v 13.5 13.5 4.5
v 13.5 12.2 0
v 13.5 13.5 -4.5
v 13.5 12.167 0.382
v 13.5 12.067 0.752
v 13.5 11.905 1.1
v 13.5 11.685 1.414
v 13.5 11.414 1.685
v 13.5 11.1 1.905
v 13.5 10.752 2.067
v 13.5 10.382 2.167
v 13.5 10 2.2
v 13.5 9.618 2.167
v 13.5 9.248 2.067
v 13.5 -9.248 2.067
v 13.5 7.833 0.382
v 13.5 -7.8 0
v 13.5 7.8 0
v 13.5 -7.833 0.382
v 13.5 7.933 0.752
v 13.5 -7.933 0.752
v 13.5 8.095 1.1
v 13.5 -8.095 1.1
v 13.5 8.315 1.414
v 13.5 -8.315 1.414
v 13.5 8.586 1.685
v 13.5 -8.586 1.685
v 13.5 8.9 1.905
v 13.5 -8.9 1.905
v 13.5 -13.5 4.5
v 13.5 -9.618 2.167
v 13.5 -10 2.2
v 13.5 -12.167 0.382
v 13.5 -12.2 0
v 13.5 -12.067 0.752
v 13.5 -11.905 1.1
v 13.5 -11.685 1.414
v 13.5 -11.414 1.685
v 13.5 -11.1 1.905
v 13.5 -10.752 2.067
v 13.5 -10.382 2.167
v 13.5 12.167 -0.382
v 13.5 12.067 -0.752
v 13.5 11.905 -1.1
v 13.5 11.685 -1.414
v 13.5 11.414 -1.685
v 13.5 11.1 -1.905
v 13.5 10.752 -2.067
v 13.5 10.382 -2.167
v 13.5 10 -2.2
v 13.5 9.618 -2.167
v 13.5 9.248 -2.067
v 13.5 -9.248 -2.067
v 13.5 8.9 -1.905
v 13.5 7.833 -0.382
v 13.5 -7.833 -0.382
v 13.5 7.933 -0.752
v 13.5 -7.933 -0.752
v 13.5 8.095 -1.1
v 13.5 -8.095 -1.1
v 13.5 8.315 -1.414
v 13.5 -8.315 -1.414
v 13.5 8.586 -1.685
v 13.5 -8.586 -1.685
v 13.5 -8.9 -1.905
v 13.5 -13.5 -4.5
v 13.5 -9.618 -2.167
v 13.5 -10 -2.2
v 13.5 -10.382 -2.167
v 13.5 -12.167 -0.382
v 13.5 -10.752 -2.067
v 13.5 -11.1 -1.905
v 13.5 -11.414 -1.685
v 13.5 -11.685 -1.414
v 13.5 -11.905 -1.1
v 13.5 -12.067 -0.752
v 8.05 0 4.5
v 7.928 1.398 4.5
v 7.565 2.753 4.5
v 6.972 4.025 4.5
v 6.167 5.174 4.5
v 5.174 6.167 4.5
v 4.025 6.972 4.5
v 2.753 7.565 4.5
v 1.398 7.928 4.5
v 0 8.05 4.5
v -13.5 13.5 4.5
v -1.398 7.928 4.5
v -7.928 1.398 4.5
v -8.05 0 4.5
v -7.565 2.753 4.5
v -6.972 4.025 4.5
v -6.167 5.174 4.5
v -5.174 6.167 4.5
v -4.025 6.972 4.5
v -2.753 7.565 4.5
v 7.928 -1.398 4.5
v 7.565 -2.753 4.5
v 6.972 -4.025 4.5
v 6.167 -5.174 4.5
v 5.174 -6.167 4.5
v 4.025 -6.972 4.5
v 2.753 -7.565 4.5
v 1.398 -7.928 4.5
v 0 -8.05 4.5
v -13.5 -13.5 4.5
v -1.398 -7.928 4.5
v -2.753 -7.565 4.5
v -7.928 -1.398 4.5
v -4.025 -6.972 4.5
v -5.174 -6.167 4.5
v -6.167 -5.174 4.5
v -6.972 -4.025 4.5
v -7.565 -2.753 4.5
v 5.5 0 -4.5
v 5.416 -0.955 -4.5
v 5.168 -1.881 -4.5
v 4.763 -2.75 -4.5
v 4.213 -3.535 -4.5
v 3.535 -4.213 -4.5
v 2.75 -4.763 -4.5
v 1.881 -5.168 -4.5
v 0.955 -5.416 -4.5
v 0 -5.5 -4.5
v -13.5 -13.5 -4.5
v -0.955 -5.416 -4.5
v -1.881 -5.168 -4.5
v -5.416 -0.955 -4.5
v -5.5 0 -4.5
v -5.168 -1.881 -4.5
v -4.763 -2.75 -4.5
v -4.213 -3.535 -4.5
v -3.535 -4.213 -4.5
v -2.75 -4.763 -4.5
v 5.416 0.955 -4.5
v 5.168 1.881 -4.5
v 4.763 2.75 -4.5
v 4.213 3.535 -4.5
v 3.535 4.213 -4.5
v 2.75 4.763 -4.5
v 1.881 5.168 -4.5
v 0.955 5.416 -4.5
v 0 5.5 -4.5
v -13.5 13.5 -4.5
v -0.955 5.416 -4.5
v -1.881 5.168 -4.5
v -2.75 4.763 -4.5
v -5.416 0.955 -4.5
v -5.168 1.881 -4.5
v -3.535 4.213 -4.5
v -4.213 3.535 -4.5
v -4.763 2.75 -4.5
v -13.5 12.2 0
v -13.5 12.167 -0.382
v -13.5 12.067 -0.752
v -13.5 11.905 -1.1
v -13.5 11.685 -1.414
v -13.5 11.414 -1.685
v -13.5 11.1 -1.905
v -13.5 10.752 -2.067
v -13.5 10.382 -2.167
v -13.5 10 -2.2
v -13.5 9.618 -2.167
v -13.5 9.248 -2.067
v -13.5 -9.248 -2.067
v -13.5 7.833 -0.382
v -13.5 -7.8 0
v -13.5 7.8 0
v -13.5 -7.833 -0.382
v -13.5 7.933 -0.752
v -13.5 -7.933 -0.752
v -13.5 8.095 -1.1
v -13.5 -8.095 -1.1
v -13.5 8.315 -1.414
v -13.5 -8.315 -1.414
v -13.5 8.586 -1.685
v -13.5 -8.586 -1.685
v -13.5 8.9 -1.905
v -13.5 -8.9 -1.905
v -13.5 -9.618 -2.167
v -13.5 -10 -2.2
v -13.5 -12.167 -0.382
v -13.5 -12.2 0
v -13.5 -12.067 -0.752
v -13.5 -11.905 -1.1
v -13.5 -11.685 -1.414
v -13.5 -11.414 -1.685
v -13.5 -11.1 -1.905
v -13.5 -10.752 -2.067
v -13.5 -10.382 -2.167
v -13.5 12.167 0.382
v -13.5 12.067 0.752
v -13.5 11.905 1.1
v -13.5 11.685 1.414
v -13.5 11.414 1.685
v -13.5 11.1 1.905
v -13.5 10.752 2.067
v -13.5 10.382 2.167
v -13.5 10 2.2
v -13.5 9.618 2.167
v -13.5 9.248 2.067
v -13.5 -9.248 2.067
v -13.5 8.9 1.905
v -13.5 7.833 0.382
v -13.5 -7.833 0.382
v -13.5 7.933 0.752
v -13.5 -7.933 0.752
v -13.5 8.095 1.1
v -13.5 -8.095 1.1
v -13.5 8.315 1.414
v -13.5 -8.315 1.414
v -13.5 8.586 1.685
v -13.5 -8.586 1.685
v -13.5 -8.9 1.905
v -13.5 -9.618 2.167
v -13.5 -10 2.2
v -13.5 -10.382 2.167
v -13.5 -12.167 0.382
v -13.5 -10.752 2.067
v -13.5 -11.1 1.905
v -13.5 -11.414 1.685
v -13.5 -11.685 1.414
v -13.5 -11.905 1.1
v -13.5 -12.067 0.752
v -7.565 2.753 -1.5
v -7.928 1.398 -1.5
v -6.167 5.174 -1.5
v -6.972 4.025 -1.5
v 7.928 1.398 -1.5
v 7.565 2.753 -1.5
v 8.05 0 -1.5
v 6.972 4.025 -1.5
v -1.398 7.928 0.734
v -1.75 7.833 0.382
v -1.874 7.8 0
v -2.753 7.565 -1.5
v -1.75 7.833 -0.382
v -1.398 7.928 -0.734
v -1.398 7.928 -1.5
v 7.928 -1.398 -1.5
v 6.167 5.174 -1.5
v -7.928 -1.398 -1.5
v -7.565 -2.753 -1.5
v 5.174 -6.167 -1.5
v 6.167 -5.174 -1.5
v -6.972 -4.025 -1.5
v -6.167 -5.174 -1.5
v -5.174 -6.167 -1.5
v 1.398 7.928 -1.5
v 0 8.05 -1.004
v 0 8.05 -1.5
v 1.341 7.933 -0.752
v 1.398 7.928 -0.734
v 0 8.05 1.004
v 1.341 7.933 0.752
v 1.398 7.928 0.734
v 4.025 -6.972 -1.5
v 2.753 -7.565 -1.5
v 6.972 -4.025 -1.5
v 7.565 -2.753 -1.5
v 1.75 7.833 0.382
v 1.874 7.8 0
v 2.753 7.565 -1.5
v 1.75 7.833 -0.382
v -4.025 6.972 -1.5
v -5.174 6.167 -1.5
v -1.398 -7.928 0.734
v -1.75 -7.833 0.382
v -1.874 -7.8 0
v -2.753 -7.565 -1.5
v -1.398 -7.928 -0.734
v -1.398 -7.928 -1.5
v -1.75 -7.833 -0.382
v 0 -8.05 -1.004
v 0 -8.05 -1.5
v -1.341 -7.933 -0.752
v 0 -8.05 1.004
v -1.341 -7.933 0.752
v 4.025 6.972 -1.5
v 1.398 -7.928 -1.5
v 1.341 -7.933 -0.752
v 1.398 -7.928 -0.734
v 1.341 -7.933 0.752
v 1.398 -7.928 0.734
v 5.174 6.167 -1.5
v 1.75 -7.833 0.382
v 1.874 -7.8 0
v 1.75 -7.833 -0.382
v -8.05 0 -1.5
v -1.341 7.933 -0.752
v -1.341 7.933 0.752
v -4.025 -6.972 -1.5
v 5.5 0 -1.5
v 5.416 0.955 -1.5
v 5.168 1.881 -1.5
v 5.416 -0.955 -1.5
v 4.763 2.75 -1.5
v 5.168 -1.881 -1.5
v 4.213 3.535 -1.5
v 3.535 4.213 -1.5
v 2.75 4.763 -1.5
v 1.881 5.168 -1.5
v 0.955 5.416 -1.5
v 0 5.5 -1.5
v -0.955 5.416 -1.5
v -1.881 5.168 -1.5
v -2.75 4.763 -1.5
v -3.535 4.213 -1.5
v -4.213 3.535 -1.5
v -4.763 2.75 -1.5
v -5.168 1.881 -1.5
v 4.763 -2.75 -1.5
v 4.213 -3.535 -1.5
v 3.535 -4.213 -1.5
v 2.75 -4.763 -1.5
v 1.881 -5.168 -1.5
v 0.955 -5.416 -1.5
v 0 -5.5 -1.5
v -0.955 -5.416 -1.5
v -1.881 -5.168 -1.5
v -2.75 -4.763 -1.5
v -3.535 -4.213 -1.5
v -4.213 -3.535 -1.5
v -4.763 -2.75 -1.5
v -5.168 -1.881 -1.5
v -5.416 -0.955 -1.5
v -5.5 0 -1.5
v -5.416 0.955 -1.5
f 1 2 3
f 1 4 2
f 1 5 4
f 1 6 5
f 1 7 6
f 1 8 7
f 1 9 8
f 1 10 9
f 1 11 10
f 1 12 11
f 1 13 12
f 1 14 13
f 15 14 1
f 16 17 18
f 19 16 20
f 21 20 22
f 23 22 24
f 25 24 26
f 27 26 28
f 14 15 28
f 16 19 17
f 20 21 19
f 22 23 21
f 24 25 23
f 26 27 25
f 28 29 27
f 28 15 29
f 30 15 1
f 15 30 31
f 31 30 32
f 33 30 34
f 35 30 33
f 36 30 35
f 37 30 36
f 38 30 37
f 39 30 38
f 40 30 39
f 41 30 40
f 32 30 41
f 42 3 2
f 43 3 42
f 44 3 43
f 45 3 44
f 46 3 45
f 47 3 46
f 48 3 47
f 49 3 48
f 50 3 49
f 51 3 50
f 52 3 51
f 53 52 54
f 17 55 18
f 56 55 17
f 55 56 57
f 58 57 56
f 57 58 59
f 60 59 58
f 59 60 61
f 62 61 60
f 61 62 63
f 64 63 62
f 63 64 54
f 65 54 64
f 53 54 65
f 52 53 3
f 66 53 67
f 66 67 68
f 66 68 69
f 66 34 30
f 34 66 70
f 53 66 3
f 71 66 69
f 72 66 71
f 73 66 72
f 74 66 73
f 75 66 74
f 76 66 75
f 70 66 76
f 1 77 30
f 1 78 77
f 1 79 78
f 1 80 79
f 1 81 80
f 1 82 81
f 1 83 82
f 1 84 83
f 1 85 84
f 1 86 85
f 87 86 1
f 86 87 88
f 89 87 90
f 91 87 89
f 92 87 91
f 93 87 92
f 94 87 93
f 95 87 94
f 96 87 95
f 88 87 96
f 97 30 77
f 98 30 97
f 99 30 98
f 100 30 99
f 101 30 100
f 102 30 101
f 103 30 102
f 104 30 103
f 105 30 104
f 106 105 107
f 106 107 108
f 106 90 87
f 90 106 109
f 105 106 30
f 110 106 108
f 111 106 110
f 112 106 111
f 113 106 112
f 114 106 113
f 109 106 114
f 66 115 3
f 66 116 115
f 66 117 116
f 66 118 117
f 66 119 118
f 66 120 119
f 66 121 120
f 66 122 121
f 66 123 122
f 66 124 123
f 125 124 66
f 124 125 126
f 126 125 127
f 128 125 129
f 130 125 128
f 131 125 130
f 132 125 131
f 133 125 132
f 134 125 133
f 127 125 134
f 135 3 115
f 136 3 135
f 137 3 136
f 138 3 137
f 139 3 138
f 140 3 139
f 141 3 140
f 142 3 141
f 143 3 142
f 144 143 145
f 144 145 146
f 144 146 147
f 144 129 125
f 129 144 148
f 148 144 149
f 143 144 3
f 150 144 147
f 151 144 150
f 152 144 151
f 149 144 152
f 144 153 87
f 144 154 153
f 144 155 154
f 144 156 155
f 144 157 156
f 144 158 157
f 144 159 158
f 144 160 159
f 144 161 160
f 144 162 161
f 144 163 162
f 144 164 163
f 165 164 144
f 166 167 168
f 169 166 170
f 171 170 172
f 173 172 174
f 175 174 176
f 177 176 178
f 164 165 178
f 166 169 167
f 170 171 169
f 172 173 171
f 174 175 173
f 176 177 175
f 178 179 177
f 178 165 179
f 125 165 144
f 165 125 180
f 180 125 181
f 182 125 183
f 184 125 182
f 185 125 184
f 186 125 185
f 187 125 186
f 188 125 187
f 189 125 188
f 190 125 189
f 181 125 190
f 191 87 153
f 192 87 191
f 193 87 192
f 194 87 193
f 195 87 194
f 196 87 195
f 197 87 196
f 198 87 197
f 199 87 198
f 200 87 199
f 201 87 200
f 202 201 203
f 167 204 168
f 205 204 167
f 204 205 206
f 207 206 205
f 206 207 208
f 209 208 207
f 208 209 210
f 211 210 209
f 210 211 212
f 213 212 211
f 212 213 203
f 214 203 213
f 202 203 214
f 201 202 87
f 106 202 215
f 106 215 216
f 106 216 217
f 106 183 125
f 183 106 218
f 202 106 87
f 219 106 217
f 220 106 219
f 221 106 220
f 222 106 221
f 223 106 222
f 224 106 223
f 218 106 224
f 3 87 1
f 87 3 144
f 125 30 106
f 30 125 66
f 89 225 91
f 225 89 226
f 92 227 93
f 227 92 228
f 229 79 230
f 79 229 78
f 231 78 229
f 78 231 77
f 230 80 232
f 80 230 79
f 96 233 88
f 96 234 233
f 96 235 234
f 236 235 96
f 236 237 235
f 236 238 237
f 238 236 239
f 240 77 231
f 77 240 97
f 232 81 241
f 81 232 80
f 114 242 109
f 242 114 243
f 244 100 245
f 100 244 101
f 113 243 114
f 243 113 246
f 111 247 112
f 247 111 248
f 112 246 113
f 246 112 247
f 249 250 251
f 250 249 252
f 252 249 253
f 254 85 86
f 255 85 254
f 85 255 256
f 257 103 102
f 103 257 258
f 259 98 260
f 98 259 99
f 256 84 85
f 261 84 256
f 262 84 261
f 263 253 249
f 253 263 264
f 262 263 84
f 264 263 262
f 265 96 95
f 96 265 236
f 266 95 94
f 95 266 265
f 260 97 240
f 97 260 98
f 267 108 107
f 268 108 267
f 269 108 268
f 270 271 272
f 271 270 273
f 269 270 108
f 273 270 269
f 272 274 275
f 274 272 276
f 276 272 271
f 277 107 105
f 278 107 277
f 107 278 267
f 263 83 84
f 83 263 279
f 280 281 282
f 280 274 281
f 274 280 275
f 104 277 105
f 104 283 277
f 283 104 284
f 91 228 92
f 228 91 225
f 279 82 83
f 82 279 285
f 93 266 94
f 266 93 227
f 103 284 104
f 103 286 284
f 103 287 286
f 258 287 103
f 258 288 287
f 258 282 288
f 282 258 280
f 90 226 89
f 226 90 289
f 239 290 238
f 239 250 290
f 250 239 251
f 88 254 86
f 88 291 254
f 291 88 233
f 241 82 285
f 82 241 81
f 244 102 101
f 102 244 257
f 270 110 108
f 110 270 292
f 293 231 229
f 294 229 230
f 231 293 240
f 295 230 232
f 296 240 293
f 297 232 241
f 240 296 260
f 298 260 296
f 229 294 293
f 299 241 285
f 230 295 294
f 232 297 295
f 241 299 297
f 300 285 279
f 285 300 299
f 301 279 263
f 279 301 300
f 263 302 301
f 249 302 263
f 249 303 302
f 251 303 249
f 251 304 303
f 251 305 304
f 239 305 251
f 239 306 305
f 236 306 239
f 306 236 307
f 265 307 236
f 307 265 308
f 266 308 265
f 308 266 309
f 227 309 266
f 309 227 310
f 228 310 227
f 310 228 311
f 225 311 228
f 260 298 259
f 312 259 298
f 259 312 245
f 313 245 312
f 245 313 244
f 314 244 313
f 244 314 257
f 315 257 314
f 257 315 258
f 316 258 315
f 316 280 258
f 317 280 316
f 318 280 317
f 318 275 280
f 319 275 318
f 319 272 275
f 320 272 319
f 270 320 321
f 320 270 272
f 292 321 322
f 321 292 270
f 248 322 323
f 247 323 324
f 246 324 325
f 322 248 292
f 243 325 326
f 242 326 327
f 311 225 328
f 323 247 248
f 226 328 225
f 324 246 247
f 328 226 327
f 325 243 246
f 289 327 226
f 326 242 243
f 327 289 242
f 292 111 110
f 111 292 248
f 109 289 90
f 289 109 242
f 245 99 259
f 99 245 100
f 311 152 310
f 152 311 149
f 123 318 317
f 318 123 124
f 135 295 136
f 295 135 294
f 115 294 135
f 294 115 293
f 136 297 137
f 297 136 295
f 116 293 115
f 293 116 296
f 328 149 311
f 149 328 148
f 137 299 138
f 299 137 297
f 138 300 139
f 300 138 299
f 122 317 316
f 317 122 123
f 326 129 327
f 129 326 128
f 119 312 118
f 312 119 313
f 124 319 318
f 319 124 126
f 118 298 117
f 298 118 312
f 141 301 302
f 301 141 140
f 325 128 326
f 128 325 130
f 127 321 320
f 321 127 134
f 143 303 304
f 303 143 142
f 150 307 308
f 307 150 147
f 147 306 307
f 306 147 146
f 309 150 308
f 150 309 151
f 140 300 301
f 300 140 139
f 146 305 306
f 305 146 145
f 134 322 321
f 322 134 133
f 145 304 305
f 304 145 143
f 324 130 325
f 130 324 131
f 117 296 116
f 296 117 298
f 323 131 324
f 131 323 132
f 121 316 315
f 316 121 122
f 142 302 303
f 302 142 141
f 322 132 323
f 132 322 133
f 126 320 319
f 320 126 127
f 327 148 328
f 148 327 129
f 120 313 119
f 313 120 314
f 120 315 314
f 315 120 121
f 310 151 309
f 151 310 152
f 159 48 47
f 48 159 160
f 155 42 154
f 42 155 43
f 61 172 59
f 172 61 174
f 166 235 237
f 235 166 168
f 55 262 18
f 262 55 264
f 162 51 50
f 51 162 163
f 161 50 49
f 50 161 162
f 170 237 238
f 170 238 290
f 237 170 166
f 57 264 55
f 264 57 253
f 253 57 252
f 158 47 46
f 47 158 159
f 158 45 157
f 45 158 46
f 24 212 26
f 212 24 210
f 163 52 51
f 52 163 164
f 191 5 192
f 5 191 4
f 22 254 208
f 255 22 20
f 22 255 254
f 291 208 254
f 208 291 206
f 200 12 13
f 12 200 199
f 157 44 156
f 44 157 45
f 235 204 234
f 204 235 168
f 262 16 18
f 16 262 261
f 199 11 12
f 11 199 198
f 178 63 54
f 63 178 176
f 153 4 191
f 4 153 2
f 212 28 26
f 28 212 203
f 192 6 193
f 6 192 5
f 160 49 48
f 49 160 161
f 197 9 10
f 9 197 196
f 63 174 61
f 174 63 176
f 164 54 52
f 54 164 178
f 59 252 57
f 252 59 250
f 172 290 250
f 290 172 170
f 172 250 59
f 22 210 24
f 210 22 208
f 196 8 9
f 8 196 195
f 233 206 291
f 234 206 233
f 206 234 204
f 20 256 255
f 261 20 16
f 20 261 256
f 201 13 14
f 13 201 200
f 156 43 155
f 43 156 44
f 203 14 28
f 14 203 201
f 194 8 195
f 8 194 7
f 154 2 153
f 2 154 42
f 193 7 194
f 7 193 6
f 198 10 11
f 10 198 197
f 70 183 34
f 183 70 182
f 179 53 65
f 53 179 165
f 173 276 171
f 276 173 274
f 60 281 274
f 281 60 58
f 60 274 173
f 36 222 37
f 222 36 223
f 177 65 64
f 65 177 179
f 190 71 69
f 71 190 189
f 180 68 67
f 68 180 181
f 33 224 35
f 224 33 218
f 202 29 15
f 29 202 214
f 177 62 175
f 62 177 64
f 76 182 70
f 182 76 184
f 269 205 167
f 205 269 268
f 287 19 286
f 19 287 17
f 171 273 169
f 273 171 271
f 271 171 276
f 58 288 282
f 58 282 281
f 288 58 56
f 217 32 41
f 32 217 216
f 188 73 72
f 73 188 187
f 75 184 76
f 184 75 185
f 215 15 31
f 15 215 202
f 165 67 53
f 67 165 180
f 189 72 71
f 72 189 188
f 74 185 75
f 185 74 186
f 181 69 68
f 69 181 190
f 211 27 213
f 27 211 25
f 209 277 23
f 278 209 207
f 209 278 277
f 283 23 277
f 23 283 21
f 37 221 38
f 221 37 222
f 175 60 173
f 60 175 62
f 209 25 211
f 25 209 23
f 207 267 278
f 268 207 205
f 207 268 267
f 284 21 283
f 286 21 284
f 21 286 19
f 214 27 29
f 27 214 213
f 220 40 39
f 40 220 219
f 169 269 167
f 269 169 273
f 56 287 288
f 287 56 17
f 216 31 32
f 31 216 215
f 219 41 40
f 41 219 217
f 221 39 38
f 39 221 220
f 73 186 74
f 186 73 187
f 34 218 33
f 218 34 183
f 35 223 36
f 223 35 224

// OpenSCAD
// holder for M5 bearing with 3x3 plate
$fn = 36;
d_o = 16.0 + 0.1;
d_o1 = 11.0;
r_ho = 2.2;

z_b = 7;
z_1 = 2.0;
z_a = z_b + z_1;

x_1 = 27;
y_1 = 27;

step_xy = 10;

module m_hole( i, j )
{
  translate([ i*step_xy, j*step_xy,z_1])  cylinder(h=2*z_a, r = r_ho, center = true );
}

module bearing_box_v()
{
  difference() {
    cube([x_1,y_1,z_a], center=true );
    translate([0,0,z_1])
      cylinder(h=z_b, r = d_o/2.0, center = true );
    translate([0,0,z_1])
      cylinder(h=2*z_a, r = d_o1/2.0, center = true );
    translate([ 0, 1*step_xy,0.0]) 
      rotate([0,90,0])
      cylinder(h=1.1*x_1, r = r_ho, center = true );
    translate([ 0, -1*step_xy,0.0]) 
      rotate([0,90,0])
      cylinder(h=1.1*x_1, r = r_ho, center = true );
    
  }

}

bearing_box_v();
